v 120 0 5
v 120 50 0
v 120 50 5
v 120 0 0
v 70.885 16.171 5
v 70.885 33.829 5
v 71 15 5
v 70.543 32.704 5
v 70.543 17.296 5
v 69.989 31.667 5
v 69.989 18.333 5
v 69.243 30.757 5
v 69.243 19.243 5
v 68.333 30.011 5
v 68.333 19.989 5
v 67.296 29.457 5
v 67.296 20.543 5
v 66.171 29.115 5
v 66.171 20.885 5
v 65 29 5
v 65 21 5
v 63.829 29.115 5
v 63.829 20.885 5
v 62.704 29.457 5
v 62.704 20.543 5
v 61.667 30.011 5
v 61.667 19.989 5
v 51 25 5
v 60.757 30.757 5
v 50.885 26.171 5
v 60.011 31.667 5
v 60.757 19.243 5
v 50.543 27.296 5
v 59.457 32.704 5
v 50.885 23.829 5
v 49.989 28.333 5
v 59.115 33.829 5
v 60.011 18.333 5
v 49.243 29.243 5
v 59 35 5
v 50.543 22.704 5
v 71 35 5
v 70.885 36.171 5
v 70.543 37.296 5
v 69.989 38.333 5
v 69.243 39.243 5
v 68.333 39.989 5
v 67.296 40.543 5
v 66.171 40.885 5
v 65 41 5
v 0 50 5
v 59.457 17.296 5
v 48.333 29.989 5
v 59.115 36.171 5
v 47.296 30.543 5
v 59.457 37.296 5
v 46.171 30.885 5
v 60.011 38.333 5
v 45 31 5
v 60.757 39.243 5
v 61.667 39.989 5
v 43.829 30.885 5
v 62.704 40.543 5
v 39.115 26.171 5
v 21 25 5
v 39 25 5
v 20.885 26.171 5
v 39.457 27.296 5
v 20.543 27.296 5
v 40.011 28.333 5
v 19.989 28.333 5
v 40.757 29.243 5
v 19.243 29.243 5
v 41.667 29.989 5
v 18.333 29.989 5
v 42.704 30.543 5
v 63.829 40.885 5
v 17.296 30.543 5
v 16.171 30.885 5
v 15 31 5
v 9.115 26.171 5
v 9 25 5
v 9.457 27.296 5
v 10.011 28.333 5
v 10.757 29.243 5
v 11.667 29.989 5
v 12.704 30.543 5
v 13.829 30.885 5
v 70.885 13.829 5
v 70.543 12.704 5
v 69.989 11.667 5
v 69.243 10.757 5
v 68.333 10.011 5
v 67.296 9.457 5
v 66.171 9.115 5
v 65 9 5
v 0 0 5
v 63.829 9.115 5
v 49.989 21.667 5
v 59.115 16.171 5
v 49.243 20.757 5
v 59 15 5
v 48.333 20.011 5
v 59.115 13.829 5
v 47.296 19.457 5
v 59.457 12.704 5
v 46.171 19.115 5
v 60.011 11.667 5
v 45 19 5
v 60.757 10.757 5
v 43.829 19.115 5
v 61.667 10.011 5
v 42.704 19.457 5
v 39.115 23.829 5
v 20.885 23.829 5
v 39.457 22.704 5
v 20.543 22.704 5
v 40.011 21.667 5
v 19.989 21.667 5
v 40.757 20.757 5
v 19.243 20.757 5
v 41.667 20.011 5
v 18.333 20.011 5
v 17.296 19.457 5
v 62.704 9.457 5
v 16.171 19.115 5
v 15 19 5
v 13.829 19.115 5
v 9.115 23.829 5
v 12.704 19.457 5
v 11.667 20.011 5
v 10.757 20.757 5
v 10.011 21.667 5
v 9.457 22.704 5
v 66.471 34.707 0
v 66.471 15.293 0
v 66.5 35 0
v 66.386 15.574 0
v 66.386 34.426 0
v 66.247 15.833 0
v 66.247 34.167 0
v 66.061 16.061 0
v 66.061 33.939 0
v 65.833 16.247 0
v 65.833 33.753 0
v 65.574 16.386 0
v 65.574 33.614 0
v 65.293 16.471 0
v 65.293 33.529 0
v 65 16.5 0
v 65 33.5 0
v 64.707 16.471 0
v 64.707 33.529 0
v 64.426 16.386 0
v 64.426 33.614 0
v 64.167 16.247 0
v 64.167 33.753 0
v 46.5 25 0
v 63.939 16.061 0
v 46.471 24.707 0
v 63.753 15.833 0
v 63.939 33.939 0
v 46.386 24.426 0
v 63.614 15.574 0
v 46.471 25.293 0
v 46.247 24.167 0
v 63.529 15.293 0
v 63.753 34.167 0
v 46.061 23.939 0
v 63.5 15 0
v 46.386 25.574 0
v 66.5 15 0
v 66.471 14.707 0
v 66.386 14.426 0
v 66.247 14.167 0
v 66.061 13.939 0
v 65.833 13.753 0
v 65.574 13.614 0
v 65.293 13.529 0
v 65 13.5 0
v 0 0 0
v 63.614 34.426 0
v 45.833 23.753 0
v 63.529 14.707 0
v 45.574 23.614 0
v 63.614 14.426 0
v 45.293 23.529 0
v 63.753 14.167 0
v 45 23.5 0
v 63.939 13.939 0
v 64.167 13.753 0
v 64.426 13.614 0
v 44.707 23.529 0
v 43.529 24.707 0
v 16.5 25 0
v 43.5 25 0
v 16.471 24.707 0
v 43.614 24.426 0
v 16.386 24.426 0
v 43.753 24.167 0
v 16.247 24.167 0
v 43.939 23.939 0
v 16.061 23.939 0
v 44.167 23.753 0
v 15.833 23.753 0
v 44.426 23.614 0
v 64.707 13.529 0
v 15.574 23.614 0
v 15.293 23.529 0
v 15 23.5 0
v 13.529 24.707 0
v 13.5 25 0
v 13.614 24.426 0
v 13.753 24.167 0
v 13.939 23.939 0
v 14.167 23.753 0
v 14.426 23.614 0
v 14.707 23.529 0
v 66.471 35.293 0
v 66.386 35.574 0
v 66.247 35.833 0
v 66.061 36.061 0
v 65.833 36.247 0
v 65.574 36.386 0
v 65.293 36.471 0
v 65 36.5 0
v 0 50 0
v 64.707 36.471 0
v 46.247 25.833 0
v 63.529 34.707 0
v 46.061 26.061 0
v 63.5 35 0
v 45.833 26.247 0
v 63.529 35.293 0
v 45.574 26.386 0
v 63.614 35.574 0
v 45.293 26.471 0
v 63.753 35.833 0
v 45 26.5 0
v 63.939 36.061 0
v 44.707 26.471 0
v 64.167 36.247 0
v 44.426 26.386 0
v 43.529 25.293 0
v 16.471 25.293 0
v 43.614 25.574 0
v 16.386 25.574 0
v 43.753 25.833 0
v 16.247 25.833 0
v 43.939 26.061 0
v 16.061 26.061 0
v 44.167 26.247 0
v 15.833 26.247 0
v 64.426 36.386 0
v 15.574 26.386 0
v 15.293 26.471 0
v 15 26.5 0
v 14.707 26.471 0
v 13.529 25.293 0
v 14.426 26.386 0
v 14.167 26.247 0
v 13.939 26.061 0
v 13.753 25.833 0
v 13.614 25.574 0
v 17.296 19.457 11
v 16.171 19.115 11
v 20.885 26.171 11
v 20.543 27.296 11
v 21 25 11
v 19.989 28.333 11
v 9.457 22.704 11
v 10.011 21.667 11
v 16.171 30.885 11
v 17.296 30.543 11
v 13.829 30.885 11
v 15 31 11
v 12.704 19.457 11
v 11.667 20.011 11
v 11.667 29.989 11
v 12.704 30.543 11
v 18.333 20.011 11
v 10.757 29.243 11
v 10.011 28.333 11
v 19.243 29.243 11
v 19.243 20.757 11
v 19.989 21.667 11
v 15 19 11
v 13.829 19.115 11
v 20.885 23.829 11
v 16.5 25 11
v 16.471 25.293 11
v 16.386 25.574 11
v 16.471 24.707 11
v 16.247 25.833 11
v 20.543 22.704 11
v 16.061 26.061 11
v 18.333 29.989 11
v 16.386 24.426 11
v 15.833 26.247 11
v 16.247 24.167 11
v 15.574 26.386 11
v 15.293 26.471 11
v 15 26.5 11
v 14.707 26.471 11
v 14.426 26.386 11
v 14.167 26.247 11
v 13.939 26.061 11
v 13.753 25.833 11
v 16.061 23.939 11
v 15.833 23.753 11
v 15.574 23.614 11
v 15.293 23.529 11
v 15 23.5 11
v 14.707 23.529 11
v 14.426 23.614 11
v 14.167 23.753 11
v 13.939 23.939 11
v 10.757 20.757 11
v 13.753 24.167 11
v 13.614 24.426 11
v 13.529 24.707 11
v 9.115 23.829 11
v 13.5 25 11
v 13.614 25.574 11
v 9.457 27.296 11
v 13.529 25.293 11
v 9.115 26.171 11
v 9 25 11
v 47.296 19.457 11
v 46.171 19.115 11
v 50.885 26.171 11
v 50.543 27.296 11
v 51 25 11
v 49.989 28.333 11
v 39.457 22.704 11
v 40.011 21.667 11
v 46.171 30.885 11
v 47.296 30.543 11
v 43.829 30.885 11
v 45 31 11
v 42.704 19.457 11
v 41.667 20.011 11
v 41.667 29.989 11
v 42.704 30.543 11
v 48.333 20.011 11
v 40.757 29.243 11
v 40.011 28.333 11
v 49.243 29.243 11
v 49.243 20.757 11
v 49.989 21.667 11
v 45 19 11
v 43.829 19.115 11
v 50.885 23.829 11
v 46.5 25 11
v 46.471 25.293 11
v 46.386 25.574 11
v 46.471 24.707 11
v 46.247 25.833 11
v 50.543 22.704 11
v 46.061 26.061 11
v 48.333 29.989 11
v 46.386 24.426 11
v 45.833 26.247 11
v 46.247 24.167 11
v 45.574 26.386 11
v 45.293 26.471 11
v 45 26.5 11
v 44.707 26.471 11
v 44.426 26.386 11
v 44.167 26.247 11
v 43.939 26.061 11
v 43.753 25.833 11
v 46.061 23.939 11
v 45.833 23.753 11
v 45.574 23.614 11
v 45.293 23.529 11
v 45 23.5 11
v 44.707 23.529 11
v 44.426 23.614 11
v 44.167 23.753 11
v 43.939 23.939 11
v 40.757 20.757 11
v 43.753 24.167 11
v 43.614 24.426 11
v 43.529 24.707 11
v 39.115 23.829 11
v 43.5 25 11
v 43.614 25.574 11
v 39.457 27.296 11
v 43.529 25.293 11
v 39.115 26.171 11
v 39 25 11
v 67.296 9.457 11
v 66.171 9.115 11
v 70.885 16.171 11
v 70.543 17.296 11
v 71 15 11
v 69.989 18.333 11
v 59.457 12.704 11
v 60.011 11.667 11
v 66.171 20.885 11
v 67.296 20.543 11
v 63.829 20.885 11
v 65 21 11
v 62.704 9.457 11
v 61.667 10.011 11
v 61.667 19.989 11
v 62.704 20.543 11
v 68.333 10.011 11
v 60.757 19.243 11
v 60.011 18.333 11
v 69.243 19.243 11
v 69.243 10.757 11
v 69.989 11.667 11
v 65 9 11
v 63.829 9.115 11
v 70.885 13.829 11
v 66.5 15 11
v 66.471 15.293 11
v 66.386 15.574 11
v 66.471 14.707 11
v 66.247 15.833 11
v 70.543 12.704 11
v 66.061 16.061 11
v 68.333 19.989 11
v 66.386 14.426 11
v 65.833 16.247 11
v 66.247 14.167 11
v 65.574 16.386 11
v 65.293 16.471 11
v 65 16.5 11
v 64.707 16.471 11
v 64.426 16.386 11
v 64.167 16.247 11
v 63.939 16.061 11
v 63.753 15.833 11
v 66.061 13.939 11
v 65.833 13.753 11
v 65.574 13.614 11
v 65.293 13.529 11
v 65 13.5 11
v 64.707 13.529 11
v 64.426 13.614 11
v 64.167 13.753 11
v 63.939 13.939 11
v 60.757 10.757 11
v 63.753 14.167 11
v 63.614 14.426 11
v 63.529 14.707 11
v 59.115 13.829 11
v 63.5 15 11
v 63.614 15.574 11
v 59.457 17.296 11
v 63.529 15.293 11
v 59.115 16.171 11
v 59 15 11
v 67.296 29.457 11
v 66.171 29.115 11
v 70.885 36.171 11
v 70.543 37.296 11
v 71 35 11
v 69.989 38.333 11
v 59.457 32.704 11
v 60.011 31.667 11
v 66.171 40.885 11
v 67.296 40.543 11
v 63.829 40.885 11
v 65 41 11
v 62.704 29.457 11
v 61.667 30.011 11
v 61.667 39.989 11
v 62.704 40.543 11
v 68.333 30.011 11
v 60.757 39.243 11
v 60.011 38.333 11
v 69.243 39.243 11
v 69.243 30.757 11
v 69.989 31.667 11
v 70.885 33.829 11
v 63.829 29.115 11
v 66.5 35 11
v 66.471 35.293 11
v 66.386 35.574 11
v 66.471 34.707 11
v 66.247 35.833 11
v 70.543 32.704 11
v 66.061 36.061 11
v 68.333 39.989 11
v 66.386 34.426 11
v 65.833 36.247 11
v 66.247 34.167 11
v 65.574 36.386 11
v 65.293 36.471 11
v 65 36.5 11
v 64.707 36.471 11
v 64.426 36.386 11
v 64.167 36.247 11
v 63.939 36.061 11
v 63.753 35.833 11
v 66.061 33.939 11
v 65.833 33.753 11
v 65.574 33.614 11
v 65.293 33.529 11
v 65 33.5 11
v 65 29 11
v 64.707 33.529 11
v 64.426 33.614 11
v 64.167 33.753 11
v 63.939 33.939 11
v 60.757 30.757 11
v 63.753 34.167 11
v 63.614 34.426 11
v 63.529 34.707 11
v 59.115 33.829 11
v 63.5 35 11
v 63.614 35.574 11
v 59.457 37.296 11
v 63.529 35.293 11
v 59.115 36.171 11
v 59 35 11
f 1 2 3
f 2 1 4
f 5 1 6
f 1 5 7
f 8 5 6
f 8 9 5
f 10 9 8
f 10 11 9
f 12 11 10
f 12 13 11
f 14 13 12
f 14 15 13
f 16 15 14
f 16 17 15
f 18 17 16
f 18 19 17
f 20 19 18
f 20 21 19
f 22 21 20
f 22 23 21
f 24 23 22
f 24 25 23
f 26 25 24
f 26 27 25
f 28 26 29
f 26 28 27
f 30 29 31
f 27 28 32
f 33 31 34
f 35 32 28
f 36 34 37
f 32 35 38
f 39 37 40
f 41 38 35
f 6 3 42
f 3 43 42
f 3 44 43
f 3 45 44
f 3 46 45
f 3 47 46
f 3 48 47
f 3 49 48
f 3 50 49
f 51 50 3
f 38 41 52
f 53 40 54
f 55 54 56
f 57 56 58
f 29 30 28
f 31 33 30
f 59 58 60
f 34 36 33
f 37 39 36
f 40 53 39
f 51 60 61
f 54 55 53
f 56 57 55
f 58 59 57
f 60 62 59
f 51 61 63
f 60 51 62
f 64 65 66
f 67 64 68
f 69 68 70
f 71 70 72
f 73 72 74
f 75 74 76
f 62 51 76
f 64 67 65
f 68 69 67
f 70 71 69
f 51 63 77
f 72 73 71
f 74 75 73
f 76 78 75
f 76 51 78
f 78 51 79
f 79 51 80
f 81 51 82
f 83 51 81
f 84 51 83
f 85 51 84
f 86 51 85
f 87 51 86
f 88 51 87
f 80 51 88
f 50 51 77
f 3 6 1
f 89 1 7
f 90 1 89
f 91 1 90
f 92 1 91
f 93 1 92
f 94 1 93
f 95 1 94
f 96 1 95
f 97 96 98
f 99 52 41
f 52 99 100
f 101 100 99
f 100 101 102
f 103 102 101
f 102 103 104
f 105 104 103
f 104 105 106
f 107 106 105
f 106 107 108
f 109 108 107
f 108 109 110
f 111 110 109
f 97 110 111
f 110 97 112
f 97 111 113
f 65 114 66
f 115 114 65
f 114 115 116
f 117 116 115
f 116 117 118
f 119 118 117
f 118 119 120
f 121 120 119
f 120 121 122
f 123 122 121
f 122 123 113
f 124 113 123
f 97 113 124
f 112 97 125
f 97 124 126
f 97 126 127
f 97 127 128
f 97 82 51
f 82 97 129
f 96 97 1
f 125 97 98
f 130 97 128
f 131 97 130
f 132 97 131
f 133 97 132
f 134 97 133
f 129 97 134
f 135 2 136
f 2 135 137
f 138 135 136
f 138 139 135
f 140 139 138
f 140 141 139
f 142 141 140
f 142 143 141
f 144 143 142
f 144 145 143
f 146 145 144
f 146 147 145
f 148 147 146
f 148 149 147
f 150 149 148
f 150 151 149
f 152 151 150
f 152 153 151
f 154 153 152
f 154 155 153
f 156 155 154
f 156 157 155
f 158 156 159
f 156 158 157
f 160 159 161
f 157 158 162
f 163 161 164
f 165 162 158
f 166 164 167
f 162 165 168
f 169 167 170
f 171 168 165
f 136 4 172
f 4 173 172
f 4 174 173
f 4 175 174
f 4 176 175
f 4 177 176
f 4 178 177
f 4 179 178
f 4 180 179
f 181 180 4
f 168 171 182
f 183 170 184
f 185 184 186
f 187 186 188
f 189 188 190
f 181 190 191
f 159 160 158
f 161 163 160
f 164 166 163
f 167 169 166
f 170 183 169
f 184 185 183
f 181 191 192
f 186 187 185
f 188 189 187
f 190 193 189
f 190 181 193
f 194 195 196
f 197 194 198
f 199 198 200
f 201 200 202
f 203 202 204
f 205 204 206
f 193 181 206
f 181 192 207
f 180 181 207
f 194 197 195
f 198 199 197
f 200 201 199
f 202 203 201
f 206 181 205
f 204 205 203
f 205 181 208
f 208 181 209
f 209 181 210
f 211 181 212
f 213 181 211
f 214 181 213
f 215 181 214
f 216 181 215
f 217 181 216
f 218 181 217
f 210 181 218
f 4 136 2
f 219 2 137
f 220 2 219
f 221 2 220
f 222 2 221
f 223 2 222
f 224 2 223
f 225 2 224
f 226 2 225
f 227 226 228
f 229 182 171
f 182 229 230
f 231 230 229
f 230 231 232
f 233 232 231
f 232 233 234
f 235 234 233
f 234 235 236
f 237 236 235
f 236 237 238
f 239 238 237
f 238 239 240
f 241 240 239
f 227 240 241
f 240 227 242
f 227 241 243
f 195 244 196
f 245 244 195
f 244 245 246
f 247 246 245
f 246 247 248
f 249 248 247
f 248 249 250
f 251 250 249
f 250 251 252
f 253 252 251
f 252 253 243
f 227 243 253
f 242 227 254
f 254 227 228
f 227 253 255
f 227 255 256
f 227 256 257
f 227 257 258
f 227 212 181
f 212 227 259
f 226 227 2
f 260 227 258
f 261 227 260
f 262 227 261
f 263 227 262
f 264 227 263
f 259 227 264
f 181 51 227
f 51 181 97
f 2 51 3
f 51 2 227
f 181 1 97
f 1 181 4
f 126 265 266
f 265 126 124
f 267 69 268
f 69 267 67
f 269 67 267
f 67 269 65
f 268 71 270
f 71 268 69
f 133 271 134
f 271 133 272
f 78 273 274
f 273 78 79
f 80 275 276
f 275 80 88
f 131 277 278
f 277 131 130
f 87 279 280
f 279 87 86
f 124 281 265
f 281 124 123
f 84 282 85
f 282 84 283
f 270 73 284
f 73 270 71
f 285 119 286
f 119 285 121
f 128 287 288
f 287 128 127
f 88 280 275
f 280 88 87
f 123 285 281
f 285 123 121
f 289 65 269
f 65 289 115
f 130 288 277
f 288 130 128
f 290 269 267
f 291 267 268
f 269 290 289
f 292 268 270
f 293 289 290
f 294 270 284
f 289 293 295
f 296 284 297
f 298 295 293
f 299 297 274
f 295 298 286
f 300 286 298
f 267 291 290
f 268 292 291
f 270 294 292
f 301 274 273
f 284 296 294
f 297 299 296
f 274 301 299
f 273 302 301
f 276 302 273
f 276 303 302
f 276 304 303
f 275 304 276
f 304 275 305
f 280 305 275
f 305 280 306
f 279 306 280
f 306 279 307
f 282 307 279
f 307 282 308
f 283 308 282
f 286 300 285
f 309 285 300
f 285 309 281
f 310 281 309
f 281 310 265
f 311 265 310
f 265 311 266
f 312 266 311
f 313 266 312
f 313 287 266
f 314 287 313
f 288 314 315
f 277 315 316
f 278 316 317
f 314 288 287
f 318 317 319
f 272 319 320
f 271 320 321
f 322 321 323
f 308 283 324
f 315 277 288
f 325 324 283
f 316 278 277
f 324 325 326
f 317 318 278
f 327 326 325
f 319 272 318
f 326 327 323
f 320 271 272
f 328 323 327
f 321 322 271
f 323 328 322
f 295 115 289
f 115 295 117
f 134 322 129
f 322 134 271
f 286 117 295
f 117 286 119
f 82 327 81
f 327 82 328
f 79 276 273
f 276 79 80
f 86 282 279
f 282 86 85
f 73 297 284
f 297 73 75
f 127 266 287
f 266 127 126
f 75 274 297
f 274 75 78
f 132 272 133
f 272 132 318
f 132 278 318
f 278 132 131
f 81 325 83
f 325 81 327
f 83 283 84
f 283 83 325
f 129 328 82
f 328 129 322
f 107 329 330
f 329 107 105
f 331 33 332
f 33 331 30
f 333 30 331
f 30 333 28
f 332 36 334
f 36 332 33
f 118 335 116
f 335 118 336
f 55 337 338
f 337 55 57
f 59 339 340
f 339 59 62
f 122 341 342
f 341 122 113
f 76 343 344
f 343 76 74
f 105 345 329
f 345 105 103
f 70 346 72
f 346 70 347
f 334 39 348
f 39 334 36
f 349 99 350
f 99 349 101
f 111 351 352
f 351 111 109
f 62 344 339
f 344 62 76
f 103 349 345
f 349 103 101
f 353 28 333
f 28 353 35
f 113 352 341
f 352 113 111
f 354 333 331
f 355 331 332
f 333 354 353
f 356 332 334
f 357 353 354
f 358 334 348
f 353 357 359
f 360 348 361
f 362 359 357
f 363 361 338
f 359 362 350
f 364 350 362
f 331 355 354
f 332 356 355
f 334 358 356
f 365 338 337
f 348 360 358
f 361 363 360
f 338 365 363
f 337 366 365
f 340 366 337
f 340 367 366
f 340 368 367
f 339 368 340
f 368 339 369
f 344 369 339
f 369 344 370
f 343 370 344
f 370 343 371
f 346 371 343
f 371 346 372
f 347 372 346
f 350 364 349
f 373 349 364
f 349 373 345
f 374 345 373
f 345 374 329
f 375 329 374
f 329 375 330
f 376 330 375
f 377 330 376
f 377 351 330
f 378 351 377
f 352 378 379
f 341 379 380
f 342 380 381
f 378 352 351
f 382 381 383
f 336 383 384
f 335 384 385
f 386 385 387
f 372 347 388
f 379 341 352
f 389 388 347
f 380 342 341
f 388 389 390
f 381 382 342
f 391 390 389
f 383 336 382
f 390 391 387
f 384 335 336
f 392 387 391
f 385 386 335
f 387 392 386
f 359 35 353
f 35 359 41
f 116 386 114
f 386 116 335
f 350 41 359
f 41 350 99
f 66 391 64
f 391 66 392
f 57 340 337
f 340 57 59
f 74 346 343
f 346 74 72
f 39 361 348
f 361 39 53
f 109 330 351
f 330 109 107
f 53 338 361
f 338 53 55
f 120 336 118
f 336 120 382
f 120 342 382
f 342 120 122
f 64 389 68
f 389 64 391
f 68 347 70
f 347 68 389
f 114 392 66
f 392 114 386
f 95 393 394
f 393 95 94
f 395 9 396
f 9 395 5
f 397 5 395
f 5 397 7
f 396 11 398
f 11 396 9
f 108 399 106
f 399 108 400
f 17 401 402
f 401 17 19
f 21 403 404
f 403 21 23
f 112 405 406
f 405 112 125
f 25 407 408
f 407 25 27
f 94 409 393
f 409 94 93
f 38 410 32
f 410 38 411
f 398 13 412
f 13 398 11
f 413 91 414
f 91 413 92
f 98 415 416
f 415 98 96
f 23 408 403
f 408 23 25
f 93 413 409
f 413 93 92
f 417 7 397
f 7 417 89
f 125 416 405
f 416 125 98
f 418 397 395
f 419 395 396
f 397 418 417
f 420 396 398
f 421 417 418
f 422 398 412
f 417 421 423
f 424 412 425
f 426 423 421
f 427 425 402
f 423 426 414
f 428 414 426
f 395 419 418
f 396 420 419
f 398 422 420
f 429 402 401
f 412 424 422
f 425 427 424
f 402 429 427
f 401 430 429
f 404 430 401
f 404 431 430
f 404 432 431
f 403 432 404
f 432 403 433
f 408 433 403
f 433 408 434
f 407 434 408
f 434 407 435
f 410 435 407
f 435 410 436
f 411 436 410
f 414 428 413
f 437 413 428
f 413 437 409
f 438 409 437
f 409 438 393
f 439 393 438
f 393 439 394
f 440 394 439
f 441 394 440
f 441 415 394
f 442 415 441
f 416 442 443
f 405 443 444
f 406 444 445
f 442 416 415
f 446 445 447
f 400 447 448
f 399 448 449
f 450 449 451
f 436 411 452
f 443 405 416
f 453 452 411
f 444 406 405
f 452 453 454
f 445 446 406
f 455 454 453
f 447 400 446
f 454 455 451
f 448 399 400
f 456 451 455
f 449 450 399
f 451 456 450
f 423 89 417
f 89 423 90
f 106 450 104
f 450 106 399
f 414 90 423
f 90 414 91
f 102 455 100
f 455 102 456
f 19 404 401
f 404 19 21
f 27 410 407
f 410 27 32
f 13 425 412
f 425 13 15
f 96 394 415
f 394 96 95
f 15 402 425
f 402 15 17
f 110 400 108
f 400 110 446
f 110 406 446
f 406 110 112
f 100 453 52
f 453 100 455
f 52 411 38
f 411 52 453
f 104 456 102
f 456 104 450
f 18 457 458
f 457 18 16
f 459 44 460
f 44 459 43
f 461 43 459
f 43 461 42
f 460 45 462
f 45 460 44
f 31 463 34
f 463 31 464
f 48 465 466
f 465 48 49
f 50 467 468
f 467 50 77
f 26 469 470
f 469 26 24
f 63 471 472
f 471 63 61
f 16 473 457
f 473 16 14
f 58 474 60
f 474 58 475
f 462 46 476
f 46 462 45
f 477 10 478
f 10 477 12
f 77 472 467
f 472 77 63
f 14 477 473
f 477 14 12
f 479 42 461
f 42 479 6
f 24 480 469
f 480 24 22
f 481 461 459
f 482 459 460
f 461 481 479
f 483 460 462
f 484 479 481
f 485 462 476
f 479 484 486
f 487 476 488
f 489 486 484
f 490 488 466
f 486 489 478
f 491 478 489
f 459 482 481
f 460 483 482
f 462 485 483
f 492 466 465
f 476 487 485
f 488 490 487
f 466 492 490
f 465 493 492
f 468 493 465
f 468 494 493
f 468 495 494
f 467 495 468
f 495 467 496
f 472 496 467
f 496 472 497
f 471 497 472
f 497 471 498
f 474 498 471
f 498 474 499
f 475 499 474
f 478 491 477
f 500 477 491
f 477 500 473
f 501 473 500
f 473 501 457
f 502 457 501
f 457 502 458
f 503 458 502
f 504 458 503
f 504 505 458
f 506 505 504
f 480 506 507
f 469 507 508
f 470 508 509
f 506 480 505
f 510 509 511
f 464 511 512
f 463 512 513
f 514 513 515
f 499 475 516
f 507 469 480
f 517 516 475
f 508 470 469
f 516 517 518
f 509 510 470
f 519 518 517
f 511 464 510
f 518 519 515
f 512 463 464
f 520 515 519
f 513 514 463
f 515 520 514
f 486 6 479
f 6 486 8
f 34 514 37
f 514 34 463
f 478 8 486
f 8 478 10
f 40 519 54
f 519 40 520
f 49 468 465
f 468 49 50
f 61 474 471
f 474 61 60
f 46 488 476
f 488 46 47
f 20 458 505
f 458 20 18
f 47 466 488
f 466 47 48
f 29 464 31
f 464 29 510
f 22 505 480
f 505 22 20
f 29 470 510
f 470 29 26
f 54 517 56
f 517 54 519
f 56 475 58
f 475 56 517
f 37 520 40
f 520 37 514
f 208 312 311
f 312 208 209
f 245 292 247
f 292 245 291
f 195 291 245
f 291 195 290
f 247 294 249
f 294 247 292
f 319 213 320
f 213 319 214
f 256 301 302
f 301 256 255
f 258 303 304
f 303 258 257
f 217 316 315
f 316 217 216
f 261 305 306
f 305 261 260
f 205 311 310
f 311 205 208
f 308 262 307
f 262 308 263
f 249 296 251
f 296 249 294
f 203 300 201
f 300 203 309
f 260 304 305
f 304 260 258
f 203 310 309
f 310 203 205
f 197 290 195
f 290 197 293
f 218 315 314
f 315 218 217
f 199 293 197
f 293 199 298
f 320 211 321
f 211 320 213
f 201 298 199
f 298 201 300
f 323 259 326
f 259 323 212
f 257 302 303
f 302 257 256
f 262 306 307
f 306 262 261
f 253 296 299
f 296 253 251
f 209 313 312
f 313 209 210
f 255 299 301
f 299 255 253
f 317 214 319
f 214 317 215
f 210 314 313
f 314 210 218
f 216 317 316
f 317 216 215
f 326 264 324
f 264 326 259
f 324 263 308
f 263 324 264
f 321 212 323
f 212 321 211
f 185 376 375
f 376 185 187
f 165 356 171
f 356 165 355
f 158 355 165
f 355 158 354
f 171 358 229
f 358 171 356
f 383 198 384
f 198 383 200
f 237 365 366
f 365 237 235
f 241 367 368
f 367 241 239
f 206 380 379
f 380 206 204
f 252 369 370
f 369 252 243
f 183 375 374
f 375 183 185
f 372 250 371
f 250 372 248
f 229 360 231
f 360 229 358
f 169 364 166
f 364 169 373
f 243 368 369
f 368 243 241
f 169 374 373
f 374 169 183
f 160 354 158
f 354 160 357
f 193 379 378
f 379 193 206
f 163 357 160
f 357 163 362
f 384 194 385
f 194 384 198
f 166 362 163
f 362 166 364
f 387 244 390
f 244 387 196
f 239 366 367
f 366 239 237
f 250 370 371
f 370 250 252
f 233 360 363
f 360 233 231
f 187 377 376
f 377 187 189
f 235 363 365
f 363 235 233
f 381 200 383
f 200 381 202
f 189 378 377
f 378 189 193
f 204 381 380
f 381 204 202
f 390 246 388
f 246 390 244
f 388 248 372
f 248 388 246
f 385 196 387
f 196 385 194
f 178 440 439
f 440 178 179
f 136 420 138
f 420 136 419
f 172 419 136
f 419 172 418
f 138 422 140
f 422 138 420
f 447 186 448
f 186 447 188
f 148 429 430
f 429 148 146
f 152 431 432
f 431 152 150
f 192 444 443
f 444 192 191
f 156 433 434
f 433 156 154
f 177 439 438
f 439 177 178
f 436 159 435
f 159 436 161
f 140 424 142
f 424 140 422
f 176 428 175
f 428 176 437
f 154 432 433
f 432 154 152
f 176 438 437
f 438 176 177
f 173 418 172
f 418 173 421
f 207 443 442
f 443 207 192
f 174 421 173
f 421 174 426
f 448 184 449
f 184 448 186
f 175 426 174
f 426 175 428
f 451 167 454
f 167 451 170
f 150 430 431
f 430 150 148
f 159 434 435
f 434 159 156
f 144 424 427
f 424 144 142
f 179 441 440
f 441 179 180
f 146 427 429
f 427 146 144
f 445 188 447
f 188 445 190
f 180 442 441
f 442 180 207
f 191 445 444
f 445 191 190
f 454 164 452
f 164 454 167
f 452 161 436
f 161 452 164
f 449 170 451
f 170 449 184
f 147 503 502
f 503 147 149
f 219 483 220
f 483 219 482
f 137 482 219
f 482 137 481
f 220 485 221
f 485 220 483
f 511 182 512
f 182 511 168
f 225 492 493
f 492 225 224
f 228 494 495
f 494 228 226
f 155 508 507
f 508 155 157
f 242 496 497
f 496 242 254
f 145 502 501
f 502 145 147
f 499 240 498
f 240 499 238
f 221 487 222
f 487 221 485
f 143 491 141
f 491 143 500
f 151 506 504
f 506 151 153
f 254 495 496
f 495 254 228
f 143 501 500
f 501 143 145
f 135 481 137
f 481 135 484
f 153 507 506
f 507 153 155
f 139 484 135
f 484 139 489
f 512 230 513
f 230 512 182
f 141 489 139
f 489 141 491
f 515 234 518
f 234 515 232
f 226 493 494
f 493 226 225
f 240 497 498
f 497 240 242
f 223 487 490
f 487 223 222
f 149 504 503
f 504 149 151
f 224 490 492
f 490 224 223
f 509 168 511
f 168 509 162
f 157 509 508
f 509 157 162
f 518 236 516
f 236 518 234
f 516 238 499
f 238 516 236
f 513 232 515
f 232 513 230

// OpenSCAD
$fn = 32;

// ----------------------------------------------------------------------
// Boss field: plate with bosses at given coordinates
// ----------------------------------------------------------------------

// --- parameters (mm) ---
plate_l = 120;            // plate length, X
plate_w = 50;             // plate width, Y
plate_t = 5;              // plate thickness, Z
boss_d = 12;              // boss diameter
boss_h = 6;               // boss height above the plate
bore_d = 3;               // boss bore

total_h = plate_t + boss_h;  // overall height

difference() {
  union() {
    cube([plate_l, plate_w, plate_t]);
    translate([15, 25, plate_t]) cylinder(h = boss_h, d = boss_d);
    translate([45, 25, plate_t]) cylinder(h = boss_h, d = boss_d);
    translate([65, 15, plate_t]) cylinder(h = boss_h, d = boss_d);
    translate([65, 35, plate_t]) cylinder(h = boss_h, d = boss_d);
  }
  translate([15, 25, -1]) cylinder(h = total_h + 2, d = bore_d);
  translate([45, 25, -1]) cylinder(h = total_h + 2, d = bore_d);
  translate([65, 15, -1]) cylinder(h = total_h + 2, d = bore_d);
  translate([65, 35, -1]) cylinder(h = total_h + 2, d = bore_d);
}
